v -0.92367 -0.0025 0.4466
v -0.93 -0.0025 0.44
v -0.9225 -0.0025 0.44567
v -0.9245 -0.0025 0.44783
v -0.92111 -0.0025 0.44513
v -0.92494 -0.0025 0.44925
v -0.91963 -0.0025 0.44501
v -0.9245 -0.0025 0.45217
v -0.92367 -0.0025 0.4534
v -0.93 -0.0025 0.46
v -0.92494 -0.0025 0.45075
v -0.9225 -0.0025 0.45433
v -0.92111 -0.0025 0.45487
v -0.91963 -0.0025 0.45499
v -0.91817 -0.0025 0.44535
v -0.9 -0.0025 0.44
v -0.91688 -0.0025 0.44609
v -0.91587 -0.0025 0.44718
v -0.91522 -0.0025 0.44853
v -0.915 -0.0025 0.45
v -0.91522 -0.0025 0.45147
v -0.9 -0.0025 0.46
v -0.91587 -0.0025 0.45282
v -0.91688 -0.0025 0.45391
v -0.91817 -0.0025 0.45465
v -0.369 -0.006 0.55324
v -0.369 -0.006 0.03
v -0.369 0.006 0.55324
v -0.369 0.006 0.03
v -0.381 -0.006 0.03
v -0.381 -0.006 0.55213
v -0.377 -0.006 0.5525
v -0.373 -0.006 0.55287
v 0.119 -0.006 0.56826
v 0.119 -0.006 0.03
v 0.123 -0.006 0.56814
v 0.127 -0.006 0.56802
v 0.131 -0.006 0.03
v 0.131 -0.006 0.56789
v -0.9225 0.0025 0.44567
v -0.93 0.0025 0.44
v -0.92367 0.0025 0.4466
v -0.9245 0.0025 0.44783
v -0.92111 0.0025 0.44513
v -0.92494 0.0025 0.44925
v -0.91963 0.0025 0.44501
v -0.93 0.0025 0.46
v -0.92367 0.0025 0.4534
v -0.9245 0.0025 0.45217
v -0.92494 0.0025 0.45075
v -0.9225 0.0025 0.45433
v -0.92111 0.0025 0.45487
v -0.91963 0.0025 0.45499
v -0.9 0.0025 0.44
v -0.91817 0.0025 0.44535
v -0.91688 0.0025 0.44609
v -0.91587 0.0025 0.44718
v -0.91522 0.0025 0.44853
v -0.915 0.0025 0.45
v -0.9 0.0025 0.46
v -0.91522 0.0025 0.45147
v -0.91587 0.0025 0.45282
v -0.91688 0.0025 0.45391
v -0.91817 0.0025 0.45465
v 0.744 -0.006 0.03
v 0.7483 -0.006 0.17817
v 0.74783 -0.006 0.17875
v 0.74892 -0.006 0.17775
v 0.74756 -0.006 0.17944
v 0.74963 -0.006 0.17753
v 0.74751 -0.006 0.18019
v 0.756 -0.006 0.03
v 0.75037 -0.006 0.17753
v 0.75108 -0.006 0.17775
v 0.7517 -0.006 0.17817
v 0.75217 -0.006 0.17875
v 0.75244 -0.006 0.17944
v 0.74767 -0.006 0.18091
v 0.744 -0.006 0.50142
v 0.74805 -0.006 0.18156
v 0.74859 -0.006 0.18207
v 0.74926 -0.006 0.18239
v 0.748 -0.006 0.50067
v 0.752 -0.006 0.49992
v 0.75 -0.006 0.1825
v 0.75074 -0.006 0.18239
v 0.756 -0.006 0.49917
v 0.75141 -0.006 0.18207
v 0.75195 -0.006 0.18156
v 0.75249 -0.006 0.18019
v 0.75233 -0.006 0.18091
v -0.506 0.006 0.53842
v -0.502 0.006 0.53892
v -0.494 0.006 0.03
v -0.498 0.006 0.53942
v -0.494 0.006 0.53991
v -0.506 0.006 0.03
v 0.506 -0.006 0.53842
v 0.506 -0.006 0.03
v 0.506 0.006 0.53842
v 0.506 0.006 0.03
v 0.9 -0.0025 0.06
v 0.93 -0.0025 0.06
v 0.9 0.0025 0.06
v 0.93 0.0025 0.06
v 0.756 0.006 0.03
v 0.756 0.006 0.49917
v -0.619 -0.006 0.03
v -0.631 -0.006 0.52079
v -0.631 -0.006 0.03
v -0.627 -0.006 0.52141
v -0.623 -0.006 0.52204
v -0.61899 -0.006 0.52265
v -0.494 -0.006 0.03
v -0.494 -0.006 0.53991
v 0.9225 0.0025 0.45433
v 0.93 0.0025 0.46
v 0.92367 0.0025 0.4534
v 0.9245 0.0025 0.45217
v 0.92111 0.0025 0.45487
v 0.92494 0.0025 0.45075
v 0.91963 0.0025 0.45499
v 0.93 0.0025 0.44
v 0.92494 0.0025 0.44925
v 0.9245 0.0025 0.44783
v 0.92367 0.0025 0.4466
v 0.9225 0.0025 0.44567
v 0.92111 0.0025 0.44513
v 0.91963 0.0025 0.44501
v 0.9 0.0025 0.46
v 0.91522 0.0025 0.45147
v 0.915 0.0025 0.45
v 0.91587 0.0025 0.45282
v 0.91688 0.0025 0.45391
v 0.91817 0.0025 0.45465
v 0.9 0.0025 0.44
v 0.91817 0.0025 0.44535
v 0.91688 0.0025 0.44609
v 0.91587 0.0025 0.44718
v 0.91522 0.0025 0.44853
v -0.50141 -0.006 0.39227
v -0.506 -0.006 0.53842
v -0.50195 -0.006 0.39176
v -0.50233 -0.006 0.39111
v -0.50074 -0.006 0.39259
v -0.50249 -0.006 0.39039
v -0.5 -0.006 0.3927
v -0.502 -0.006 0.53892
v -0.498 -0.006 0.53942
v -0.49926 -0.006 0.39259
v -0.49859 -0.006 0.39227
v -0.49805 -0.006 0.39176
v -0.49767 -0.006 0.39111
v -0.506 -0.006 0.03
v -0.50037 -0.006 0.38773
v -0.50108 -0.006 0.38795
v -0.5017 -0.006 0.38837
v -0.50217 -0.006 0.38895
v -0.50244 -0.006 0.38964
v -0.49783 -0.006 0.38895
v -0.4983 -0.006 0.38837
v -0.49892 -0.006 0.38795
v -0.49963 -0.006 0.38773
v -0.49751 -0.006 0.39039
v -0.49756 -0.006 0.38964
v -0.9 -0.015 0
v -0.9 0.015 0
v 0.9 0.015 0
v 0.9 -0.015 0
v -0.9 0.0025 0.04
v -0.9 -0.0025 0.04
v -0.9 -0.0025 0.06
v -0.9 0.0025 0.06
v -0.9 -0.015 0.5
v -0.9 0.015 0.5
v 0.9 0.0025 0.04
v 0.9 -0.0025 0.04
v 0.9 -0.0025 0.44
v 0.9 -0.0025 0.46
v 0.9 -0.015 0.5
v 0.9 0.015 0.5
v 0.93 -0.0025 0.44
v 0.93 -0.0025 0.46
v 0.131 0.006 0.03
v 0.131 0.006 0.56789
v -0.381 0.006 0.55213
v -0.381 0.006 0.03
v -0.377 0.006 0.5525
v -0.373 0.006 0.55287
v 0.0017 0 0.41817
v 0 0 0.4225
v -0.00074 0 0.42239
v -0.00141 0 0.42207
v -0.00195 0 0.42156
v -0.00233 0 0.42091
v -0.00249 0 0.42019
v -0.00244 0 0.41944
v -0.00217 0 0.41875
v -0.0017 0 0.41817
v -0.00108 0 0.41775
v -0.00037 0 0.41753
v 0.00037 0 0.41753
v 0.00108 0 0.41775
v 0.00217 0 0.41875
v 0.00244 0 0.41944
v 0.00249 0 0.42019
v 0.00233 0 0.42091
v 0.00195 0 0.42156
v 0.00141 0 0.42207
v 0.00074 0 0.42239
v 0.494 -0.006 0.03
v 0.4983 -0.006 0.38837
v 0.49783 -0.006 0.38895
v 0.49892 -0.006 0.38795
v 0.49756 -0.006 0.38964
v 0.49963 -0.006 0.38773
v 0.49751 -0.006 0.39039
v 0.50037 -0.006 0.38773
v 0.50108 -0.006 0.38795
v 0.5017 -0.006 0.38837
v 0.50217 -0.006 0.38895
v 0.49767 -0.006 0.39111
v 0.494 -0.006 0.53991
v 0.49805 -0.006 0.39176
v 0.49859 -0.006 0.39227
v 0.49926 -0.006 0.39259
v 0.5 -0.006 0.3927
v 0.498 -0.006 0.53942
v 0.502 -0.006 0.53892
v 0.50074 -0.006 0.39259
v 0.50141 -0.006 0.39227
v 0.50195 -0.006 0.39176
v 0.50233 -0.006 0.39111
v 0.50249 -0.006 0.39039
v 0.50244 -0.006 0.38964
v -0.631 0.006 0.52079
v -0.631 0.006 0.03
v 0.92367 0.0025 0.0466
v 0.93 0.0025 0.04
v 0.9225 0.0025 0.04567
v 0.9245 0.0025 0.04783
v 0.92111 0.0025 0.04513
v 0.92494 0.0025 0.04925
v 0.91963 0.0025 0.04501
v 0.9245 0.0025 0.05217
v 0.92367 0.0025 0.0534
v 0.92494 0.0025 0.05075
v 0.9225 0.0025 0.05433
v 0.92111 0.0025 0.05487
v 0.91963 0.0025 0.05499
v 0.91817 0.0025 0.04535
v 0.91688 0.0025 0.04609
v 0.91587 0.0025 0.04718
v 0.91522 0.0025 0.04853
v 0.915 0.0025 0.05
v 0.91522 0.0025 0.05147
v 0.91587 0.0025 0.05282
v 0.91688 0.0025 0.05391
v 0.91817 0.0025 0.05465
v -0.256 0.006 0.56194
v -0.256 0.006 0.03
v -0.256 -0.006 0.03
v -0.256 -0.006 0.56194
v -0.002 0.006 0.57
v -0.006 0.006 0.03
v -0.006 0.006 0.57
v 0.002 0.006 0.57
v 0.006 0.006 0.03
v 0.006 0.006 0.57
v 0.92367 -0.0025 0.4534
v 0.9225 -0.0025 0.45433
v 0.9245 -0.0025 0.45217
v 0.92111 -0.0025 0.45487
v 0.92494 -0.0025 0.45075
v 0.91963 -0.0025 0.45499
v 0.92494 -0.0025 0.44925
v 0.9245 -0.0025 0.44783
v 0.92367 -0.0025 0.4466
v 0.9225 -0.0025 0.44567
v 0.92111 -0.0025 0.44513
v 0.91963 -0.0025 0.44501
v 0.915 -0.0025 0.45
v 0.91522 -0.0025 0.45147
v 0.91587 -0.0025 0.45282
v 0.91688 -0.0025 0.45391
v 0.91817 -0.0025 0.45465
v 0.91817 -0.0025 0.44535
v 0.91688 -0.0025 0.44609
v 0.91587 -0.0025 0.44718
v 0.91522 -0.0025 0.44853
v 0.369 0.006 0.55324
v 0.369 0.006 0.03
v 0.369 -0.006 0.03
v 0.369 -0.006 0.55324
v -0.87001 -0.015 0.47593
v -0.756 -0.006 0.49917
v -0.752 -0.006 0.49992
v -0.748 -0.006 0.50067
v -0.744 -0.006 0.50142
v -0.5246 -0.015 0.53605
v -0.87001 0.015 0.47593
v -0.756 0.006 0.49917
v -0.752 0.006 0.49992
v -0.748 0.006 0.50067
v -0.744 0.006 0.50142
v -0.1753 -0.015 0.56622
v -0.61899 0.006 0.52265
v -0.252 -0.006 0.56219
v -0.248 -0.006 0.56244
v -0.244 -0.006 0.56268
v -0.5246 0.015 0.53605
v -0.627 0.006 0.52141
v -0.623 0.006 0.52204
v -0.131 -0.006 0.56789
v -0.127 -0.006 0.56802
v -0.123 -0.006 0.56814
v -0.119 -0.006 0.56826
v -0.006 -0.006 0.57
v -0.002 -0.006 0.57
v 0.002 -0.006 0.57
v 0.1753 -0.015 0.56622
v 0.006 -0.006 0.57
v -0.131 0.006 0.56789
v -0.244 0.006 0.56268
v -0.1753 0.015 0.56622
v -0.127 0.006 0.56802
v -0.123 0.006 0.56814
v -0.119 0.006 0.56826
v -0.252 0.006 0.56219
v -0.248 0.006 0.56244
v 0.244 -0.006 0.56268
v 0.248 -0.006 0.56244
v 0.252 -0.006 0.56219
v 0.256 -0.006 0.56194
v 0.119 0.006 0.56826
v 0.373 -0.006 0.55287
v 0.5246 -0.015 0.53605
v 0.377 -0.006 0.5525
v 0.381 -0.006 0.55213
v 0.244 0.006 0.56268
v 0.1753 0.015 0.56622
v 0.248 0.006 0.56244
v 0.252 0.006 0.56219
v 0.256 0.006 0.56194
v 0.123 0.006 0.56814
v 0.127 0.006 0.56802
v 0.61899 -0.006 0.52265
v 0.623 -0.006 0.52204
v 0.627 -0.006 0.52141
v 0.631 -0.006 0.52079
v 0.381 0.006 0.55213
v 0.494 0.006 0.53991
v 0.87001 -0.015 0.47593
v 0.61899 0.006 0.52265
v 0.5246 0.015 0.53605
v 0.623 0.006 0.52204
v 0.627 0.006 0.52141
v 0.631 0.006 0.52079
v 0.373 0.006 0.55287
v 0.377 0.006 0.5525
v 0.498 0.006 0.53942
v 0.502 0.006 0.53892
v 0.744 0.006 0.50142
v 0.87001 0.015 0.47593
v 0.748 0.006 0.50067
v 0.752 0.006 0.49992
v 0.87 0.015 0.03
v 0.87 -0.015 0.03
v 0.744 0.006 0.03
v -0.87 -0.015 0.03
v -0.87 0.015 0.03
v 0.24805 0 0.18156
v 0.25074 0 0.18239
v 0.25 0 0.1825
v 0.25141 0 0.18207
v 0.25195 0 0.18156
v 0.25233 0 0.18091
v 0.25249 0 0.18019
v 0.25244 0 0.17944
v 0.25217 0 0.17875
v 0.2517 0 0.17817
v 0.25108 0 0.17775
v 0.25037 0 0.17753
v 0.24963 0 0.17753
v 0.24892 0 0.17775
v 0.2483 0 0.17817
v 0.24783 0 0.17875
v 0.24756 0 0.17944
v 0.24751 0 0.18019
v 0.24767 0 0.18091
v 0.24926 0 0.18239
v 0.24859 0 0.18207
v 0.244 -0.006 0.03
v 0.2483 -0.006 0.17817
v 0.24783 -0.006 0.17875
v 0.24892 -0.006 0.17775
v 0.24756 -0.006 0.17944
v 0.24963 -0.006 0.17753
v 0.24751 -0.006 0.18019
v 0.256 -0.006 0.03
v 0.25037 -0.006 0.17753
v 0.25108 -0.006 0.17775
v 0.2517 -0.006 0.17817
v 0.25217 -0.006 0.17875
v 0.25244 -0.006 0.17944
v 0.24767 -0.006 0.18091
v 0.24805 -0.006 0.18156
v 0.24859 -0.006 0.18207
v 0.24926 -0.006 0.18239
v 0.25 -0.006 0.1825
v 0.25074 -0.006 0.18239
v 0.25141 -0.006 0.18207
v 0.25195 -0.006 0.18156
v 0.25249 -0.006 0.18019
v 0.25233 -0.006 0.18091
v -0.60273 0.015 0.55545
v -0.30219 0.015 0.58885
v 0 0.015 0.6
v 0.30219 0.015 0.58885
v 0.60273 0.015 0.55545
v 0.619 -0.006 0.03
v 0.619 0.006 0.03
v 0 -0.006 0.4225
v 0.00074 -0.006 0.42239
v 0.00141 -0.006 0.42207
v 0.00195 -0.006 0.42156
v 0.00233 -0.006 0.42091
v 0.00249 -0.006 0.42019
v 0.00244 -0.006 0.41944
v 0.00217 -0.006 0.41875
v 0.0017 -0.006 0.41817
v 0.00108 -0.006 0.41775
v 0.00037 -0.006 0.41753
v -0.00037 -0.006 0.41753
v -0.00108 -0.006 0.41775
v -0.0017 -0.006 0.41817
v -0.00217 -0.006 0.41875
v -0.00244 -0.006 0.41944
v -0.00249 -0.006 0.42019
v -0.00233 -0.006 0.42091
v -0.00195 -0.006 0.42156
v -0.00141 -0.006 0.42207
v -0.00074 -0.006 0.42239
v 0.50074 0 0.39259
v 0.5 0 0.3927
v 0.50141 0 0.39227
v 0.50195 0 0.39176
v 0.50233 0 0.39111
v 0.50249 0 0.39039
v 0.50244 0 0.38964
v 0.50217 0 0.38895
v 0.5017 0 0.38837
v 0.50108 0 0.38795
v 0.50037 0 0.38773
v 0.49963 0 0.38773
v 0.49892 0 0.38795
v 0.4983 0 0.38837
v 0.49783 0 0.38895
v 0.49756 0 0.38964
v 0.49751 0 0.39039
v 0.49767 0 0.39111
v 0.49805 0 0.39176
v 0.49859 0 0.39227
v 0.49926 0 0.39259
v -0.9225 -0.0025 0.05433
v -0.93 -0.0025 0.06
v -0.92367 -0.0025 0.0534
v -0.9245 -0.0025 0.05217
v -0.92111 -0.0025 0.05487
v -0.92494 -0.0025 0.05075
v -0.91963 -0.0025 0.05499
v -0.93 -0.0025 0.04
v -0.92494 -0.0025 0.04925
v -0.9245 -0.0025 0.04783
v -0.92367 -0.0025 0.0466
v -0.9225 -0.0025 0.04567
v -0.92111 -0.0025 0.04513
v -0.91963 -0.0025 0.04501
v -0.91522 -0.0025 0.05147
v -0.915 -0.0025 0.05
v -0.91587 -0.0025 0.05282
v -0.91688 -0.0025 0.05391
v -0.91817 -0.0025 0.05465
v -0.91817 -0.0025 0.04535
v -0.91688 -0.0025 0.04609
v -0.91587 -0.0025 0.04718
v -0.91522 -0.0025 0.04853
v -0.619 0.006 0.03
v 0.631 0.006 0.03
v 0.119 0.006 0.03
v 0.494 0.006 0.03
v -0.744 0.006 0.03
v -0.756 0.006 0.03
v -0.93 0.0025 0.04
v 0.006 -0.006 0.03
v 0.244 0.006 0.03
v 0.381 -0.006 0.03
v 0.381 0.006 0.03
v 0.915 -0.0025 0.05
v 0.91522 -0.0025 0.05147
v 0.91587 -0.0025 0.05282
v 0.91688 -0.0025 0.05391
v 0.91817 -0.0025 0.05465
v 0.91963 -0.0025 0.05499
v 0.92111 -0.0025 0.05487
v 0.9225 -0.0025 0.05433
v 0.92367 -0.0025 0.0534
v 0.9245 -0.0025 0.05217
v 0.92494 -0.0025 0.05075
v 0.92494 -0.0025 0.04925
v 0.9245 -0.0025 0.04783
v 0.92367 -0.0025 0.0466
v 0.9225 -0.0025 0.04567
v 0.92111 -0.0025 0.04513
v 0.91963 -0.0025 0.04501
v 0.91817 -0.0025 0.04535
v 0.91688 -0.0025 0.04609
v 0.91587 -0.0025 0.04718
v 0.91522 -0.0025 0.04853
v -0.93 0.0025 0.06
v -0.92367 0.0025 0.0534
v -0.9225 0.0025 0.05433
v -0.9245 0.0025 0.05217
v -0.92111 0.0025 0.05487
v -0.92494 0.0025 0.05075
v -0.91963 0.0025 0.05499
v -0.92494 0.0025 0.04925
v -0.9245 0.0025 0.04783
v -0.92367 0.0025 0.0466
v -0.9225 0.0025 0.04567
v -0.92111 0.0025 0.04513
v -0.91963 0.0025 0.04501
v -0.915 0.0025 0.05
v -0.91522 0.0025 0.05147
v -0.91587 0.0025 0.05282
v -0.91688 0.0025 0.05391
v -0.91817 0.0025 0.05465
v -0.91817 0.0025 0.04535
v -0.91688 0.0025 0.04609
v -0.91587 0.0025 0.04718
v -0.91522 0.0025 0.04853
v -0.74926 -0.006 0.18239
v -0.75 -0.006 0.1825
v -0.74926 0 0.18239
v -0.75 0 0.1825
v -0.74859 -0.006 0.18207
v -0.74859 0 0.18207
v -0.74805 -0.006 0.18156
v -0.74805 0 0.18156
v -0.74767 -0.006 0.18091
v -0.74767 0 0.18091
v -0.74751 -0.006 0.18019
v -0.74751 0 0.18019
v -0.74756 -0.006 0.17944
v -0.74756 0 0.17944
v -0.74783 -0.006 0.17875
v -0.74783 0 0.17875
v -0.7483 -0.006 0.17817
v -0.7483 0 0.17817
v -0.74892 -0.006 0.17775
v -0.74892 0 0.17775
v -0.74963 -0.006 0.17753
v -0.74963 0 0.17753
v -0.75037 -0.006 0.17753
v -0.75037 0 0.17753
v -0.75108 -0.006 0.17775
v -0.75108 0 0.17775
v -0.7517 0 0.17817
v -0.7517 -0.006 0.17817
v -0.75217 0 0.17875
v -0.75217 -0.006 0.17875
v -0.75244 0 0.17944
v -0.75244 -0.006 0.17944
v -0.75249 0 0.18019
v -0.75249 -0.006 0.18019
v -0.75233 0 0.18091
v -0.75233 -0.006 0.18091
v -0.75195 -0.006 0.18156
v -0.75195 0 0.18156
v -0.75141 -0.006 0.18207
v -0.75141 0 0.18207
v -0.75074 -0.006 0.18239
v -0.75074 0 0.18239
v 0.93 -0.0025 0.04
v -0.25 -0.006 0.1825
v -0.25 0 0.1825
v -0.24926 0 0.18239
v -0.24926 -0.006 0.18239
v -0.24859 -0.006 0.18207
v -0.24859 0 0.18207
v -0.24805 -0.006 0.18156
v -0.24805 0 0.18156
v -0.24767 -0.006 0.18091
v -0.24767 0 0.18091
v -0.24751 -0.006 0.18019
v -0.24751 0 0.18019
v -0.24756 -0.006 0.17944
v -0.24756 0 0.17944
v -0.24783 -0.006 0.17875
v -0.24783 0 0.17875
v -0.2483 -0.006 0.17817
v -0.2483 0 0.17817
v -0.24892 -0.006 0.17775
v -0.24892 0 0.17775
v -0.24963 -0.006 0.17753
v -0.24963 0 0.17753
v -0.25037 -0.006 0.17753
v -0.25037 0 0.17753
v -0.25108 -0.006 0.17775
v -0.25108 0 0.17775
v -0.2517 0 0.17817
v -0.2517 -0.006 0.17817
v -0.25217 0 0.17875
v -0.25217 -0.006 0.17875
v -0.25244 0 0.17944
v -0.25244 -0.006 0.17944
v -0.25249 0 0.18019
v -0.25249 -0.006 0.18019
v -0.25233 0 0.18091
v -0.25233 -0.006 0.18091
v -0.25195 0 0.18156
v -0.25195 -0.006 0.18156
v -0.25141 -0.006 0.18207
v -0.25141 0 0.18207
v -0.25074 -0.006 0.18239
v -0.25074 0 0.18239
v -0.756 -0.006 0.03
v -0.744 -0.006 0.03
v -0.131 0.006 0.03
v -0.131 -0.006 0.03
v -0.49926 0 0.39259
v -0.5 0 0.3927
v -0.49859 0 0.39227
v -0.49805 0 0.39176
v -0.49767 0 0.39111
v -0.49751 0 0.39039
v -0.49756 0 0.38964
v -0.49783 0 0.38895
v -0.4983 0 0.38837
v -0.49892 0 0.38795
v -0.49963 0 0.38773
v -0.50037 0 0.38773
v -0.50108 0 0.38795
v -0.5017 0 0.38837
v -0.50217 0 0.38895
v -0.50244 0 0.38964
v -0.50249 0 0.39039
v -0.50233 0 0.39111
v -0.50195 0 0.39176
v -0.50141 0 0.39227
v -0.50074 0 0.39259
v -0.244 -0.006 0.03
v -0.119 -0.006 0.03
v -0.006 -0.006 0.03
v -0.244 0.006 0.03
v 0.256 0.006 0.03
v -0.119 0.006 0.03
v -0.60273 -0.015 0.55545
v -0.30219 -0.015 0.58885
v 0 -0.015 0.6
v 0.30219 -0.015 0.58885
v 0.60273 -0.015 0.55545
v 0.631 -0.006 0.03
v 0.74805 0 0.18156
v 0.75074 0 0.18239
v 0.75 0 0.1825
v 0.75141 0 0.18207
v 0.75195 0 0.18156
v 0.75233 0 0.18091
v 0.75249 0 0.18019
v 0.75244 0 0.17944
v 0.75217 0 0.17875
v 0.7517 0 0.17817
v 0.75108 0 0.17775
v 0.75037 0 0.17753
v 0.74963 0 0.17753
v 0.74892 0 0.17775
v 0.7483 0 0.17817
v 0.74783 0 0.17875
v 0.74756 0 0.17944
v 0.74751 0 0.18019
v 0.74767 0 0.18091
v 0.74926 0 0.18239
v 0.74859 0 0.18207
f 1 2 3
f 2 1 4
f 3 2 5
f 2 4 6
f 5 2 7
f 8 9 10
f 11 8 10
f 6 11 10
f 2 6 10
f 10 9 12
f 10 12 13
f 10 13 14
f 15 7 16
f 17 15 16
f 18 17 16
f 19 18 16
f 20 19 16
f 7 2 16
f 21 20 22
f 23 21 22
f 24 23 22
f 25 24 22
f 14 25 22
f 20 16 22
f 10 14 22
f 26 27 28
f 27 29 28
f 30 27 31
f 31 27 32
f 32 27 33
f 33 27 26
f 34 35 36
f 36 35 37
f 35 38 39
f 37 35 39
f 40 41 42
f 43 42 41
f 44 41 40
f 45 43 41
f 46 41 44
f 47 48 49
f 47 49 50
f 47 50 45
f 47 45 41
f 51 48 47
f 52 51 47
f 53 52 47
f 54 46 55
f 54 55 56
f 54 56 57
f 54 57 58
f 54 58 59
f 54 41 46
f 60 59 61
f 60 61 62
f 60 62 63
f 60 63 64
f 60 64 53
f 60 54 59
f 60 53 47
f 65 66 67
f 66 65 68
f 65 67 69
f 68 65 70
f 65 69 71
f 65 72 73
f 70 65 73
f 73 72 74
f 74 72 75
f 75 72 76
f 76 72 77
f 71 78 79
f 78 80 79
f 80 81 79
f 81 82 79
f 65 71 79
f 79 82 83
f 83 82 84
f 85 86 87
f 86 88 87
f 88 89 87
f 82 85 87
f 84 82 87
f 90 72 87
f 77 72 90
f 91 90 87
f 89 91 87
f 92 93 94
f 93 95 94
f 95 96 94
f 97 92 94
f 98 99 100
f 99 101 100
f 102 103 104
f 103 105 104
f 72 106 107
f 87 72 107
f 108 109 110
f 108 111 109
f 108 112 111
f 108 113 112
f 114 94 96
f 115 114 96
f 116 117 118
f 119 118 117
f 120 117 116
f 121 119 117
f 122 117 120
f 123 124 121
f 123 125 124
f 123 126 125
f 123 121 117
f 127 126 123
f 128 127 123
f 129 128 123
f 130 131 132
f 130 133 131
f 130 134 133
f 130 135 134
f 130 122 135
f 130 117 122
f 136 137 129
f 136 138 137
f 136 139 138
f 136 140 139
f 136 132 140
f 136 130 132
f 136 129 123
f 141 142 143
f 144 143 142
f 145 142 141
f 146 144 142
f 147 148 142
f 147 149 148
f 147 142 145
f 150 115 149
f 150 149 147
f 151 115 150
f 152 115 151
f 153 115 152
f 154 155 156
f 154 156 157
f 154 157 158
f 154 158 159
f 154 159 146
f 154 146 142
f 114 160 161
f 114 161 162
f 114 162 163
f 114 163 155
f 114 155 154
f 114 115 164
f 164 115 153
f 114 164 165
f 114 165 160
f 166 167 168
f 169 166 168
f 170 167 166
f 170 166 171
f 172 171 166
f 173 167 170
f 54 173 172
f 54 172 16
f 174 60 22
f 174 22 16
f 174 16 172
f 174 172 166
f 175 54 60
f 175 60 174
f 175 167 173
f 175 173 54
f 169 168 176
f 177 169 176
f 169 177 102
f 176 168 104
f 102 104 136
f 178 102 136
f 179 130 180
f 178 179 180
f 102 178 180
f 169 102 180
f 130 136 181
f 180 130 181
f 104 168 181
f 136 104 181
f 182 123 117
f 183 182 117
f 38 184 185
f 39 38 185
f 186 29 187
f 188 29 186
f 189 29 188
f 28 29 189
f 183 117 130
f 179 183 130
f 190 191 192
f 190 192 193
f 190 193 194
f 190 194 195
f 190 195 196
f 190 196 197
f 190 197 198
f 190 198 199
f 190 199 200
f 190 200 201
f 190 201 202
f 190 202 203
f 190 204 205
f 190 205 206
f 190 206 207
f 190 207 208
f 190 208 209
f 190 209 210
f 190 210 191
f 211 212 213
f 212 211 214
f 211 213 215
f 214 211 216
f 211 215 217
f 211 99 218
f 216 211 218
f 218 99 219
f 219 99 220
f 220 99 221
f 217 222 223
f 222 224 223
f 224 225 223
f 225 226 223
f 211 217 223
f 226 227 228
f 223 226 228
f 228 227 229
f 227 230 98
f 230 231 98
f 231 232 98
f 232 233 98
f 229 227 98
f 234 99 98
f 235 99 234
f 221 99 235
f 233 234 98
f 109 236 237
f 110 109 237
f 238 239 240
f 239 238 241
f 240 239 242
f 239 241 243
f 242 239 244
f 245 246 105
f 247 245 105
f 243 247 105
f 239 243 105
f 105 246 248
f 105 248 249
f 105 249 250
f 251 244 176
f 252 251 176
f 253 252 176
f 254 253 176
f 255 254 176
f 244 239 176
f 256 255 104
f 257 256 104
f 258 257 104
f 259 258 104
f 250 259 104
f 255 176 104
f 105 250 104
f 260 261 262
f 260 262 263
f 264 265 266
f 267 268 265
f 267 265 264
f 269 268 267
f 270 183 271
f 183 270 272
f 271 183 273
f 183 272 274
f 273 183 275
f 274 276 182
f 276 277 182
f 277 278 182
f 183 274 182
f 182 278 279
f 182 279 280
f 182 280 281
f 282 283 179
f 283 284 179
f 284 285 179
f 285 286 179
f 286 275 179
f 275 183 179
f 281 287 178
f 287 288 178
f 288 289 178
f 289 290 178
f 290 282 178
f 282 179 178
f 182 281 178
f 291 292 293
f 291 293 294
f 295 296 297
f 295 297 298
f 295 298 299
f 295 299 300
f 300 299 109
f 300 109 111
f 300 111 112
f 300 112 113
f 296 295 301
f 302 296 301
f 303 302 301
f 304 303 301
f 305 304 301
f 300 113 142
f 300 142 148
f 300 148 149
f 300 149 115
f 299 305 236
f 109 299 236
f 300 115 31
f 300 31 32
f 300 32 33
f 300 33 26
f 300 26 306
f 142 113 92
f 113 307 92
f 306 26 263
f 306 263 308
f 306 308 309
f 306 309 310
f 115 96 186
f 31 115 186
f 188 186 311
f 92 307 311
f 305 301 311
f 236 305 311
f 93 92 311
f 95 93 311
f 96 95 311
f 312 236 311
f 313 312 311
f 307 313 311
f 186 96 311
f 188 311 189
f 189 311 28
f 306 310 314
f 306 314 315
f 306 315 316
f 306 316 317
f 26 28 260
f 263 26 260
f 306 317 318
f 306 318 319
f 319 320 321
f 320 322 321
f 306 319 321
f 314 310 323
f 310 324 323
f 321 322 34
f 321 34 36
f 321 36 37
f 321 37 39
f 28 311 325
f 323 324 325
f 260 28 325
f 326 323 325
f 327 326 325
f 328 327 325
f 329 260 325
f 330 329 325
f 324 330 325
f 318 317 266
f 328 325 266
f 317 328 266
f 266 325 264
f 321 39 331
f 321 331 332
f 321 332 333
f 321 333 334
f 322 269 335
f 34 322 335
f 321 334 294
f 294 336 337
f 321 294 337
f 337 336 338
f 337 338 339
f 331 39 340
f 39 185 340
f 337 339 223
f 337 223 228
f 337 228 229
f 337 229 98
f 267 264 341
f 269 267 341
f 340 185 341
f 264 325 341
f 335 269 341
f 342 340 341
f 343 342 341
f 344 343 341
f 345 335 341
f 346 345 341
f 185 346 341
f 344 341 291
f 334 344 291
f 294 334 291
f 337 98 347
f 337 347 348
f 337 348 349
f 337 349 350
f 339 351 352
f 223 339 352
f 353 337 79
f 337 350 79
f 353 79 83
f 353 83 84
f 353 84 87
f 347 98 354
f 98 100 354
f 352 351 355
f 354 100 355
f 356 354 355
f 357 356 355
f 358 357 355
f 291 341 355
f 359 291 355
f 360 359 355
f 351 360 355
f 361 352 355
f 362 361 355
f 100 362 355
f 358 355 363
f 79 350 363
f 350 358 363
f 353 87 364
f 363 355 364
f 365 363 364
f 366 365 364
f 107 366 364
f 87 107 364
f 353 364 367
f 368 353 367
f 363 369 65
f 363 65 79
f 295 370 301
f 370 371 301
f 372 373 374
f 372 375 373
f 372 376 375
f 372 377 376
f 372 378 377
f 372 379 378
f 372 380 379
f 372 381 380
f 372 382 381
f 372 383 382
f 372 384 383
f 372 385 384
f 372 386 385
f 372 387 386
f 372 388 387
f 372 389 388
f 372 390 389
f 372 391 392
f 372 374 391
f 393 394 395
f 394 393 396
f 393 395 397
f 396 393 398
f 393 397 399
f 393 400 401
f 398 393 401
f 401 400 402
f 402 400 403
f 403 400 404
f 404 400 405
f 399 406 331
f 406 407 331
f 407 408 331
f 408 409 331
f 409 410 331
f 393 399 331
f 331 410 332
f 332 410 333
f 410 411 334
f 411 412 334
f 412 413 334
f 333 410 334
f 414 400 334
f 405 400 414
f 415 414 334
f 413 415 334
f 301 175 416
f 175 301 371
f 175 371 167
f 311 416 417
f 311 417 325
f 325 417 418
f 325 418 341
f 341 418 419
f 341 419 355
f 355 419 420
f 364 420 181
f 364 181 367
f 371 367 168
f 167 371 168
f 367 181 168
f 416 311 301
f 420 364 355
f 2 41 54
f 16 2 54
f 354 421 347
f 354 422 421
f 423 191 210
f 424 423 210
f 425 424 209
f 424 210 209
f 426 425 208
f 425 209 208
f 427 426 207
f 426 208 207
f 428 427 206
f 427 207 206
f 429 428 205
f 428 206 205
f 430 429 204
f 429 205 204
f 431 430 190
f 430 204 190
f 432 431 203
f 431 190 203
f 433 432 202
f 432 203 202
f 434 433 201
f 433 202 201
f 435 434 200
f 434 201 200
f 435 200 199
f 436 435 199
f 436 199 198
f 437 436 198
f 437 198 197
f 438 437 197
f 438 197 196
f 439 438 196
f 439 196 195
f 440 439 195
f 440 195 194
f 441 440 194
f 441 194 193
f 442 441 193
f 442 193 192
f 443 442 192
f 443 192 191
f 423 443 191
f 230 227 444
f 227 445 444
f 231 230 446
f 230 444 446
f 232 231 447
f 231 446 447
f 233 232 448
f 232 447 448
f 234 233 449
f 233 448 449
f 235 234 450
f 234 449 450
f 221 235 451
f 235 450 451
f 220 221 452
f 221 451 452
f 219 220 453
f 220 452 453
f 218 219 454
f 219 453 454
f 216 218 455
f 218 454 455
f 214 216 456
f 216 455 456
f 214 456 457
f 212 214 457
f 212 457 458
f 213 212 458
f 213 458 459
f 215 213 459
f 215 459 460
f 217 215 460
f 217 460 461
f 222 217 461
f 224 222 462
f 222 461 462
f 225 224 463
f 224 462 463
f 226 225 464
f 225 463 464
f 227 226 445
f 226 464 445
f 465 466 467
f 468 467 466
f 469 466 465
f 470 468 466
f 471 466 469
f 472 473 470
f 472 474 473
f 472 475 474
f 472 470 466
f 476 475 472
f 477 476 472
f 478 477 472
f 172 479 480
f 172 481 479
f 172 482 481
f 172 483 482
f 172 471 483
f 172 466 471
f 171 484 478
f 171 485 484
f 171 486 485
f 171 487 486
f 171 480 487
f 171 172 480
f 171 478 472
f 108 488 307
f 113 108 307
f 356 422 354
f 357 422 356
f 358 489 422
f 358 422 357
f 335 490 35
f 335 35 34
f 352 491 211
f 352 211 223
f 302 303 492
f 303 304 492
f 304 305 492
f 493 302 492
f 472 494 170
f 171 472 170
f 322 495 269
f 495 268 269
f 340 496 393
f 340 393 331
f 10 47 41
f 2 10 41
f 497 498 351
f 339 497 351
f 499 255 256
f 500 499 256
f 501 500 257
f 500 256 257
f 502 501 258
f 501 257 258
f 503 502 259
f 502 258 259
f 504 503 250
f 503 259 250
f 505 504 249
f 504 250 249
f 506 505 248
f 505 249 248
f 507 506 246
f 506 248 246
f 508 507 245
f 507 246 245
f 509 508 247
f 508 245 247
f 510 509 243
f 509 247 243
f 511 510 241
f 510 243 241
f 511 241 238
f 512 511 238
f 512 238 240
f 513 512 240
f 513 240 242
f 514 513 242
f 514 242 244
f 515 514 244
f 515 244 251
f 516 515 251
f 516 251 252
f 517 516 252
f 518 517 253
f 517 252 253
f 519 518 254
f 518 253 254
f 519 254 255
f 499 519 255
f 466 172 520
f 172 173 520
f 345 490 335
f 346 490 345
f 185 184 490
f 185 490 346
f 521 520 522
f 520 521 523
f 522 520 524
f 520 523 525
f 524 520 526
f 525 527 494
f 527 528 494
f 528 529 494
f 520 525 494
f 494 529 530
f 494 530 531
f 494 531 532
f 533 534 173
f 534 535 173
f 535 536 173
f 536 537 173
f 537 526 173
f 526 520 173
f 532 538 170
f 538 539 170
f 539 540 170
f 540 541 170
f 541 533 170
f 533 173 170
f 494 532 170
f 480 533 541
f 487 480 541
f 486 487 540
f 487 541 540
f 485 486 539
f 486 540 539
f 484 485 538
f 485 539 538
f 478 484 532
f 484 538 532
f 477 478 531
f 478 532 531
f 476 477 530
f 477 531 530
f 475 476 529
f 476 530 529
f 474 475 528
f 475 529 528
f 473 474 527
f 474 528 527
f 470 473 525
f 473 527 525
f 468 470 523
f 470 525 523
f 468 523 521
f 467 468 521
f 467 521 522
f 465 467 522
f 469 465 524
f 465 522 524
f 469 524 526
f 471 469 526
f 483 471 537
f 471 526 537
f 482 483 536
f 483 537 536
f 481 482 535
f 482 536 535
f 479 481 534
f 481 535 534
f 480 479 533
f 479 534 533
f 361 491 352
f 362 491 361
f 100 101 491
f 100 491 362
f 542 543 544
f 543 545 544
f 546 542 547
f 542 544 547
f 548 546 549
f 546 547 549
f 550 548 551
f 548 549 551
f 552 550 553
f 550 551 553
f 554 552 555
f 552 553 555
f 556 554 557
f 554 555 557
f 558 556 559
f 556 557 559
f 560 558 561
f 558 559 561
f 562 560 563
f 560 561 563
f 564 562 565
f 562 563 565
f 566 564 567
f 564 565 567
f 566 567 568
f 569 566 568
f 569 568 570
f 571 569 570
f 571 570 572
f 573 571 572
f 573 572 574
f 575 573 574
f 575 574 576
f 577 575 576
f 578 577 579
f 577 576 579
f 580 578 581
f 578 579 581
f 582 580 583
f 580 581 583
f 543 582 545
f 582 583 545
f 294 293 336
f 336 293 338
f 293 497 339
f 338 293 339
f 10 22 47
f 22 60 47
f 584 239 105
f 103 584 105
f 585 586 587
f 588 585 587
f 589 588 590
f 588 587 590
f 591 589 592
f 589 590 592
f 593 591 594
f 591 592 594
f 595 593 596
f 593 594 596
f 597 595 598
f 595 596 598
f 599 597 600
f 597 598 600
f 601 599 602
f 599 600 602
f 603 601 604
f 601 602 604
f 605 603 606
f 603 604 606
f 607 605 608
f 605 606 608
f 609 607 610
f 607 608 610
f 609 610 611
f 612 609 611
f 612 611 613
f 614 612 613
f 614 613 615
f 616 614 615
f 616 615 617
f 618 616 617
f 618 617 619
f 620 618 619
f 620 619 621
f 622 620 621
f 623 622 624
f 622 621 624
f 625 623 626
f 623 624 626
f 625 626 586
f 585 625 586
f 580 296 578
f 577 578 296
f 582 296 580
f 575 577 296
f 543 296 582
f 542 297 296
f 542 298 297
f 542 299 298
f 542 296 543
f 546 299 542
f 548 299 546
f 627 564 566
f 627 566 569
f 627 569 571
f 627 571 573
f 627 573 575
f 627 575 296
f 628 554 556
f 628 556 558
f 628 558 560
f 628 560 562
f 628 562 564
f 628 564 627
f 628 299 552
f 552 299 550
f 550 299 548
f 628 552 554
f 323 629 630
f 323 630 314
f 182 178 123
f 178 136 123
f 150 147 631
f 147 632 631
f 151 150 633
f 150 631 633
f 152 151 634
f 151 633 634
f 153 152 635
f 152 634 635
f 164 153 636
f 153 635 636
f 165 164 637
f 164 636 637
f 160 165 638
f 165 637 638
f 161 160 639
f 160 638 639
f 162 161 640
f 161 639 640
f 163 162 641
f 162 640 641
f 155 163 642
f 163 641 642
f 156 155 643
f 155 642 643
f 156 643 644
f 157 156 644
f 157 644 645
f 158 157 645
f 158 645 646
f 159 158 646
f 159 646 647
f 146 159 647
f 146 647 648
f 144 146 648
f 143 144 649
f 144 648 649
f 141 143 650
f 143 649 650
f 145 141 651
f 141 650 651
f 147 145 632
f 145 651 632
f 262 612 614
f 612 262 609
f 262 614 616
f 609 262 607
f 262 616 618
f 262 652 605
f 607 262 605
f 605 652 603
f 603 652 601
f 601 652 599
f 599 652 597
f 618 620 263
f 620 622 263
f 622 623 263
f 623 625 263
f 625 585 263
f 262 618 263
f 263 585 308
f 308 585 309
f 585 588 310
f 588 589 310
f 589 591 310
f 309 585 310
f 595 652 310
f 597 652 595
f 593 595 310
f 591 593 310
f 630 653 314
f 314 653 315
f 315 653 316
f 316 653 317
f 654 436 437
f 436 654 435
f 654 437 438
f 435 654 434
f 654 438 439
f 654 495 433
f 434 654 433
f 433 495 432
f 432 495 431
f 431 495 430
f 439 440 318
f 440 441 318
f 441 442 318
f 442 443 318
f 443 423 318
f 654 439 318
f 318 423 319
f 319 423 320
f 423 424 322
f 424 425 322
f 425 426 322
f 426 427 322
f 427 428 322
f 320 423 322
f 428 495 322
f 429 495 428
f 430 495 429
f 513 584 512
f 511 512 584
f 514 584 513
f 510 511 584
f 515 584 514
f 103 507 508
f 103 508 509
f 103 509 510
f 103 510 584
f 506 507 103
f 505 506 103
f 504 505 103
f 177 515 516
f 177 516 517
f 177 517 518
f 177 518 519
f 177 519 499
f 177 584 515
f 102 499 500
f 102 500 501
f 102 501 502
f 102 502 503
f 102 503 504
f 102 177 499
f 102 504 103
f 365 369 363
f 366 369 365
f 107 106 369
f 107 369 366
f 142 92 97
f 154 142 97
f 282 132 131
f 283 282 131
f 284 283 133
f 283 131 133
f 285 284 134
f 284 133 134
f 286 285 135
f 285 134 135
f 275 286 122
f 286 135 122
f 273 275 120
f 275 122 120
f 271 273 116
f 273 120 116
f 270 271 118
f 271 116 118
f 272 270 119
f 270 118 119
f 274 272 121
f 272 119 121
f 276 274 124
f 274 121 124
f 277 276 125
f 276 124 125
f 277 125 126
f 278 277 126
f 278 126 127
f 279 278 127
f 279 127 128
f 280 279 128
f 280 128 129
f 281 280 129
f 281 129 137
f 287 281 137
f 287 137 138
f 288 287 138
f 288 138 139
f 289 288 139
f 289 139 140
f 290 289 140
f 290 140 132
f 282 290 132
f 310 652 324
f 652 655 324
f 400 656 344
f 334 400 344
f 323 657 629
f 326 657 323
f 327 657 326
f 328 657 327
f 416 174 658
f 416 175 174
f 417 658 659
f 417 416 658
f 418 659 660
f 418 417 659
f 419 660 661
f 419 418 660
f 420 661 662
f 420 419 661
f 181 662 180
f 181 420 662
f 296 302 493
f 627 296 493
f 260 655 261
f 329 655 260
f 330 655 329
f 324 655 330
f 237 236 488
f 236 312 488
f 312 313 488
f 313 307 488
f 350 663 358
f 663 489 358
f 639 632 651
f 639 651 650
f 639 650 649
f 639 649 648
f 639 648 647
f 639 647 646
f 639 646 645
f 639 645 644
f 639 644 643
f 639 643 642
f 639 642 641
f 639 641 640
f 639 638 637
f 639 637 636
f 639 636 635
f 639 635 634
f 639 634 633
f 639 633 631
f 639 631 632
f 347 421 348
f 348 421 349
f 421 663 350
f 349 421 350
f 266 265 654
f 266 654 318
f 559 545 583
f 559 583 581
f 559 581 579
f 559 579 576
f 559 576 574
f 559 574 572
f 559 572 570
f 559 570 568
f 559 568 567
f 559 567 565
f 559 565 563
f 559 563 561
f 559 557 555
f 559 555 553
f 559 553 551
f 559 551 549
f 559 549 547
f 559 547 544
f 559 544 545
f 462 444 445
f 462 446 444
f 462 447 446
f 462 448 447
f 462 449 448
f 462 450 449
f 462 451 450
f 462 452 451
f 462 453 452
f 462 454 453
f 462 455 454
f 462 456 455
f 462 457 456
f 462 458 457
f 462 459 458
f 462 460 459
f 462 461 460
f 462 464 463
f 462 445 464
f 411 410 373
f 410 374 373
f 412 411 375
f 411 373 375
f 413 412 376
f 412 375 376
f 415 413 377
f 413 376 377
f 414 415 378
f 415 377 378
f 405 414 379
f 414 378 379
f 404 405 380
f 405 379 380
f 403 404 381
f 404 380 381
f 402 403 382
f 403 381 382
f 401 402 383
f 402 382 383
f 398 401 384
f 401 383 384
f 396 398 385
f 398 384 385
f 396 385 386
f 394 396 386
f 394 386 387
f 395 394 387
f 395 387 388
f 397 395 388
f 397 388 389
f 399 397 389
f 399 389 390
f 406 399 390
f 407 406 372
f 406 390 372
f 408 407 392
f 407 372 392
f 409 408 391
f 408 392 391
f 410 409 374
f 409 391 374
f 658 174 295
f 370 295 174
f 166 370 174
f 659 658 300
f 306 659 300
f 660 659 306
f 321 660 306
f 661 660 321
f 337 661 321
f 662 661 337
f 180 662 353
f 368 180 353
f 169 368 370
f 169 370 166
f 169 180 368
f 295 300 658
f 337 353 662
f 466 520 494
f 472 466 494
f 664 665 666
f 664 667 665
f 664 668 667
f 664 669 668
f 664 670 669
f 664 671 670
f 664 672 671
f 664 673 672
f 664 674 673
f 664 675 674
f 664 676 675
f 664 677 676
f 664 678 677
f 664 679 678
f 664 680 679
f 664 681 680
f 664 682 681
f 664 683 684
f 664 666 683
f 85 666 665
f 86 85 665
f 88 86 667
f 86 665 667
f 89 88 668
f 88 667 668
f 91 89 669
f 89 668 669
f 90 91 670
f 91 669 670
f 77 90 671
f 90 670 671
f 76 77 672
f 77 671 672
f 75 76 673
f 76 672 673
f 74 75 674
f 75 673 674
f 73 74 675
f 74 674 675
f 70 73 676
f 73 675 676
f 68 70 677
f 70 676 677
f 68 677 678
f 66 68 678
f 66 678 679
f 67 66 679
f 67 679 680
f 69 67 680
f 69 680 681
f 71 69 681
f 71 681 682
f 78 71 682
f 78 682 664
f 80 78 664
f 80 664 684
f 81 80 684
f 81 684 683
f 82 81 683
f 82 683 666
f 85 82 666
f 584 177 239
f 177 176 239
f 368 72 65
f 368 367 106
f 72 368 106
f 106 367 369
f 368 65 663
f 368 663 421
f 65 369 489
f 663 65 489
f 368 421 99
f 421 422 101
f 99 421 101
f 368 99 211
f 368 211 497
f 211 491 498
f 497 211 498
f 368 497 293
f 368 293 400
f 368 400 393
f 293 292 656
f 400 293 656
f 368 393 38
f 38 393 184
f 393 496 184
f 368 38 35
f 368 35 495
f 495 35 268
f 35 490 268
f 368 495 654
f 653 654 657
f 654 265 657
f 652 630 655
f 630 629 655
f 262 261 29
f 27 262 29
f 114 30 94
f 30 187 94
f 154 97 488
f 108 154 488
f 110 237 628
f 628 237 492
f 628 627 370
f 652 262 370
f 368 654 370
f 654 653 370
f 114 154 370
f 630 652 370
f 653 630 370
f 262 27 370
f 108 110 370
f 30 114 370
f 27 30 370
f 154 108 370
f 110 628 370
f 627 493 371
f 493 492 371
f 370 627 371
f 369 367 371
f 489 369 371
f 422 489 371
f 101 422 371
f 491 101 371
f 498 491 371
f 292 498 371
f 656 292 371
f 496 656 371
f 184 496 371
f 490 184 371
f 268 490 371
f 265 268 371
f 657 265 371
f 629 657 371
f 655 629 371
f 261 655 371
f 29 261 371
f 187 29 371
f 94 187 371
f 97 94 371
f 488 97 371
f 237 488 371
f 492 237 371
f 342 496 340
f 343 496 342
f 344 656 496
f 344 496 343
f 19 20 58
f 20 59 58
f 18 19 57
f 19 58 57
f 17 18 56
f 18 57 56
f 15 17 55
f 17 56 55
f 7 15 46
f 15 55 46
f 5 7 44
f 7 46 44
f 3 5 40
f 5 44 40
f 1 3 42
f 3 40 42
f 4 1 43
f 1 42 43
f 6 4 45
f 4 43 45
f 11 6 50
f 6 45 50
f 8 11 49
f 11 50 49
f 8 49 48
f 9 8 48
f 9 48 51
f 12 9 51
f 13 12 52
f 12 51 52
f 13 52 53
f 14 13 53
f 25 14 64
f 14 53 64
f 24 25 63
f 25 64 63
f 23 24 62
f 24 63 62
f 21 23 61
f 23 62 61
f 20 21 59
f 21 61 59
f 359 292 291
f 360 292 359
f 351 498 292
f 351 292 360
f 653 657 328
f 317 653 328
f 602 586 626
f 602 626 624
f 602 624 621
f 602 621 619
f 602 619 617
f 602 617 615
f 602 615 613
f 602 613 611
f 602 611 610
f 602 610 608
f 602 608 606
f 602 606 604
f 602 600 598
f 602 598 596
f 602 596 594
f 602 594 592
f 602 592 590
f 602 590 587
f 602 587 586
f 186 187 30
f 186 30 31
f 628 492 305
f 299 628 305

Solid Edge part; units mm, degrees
sketch "Sketch1" plane through (0, 0, 0) normal (0, -1, 0) x (1, 0, 0)
  line L0 (-0.87, 0.03) -> (-0.87, 0.4759)
  arc A0 (-0.87, 0.4759) -> (0.87, 0.4759) centre (0, -3.5) cw
  line L1 (0.87, 0.4759) -> (0.87, 0.03)
  line L2 (0.87, 0.03) -> (-0.87, 0.03)
  line L3 (-0.9, 0) -> (0.9, 0)
  line L4 (0.9, 0) -> (0.9, 0.5)
  line L5 (-0.9, 0) -> (-0.9, 0.5)
  arc A1 (0.9, 0.5) -> (-0.9, 0.5) centre (0, -3.5) ccw
  dimension "D1" = 0.9
  dimension "D2" = 0.9
extrude "Protrusion1" add sketch "Sketch1" along normal mid plane 0.03
sketch "Sketch2" plane through (0, 0, 0) normal (0, -1, 0) x (1, 0, 0)
  line L0 (-0.756, 0.4992) -> (-0.756, 0.03)
  line L1 (-0.744, 0.03) -> (-0.756, 0.03)
  line L2 (-0.744, 0.03) -> (-0.744, 0.5014)
  arc A0 (-0.756, 0.4992) -> (-0.744, 0.5014) centre (0, -3.5) cw
  line L3 (-0.631, 0.5208) -> (-0.631, 0.03)
  line L4 (-0.619, 0.03) -> (-0.631, 0.03)
  line L5 (-0.619, 0.03) -> (-0.619, 0.5227)
  arc A1 (-0.631, 0.5208) -> (-0.619, 0.5227) centre (0, -3.5) cw
  line L6 (-0.506, 0.5384) -> (-0.506, 0.03)
  line L7 (-0.494, 0.03) -> (-0.506, 0.03)
  line L8 (-0.494, 0.03) -> (-0.494, 0.5399)
  arc A2 (-0.506, 0.5384) -> (-0.494, 0.5399) centre (0, -3.5) cw
  line L9 (-0.381, 0.03) -> (-0.381, 0.5521)
  arc A3 (-0.381, 0.5521) -> (-0.369, 0.5532) centre (0, -3.5) cw
  line L10 (-0.369, 0.03) -> (-0.369, 0.5532)
  line L11 (-0.369, 0.03) -> (-0.381, 0.03)
  line L12 (-0.256, 0.03) -> (-0.256, 0.5619)
  arc A4 (-0.256, 0.5619) -> (-0.244, 0.5627) centre (0, -3.5) cw
  line L13 (-0.244, 0.03) -> (-0.244, 0.5627)
  line L14 (-0.244, 0.03) -> (-0.256, 0.03)
  line L15 (-0.131, 0.03) -> (-0.131, 0.5679)
  arc A5 (-0.131, 0.5679) -> (-0.119, 0.5683) centre (0, -3.5) cw
  line L16 (-0.119, 0.03) -> (-0.119, 0.5683)
  line L17 (-0.119, 0.03) -> (-0.131, 0.03)
  line L18 (-0.006, 0.03) -> (-0.006, 0.57)
  arc A6 (-0.006, 0.57) -> (0.006, 0.57) centre (0, -3.5) cw
  line L19 (0.006, 0.03) -> (0.006, 0.57)
  line L20 (0.006, 0.03) -> (-0.006, 0.03)
  line L21 (0.119, 0.03) -> (0.119, 0.5683)
  arc A7 (0.119, 0.5683) -> (0.131, 0.5679) centre (0, -3.5) cw
  line L22 (0.131, 0.03) -> (0.131, 0.5679)
  line L23 (0.131, 0.03) -> (0.119, 0.03)
  line L24 (0.244, 0.03) -> (0.244, 0.5627)
  arc A8 (0.244, 0.5627) -> (0.256, 0.5619) centre (0, -3.5) cw
  line L25 (0.256, 0.03) -> (0.256, 0.5619)
  line L26 (0.256, 0.03) -> (0.244, 0.03)
  line L27 (0.369, 0.03) -> (0.369, 0.5532)
  arc A9 (0.369, 0.5532) -> (0.381, 0.5521) centre (0, -3.5) cw
  line L28 (0.381, 0.03) -> (0.381, 0.5521)
  line L29 (0.381, 0.03) -> (0.369, 0.03)
  line L30 (0.494, 0.03) -> (0.494, 0.5399)
  arc A10 (0.494, 0.5399) -> (0.506, 0.5384) centre (0, -3.5) cw
  line L31 (0.506, 0.03) -> (0.506, 0.5384)
  line L32 (0.506, 0.03) -> (0.494, 0.03)
  line L33 (0.619, 0.03) -> (0.619, 0.5227)
  arc A11 (0.619, 0.5227) -> (0.631, 0.5208) centre (0, -3.5) cw
  line L34 (0.631, 0.03) -> (0.631, 0.5208)
  line L35 (0.631, 0.03) -> (0.619, 0.03)
  arc A12 (0.744, 0.5014) -> (0.756, 0.4992) centre (0, -3.5) cw
  line L36 (0.756, 0.03) -> (0.756, 0.4992)
  line L37 (0.756, 0.03) -> (0.744, 0.03)
  line L38 (0.744, 0.03) -> (0.744, 0.5014)
  dimension "D1" = 0.012
  dimension "D2" = 0.125
extrude "Stangen" add sketch "Sketch2" along normal mid plane 0.012
hole "Bohrung_1" at (0, 0, 0.42) direction (0, -1, 0) diameter 0.005 end through all
hole "Bohrung_2" at (-0.25, 0, 0.18) direction (0, -1, 0) diameter 0.005 end through all
hole "Hole1" at (-0.5, 0, 0.3902) direction (0, -1, 0) diameter 0.005 end through all
hole "Hole2" at (-0.75, 0, 0.18) direction (0, -1, 0) diameter 0.005 end through all
sketch "Sketch3" plane through (0, 0, 0) normal (0, -1, 0) x (1, 0, 0)
  line L0 (-0.9, 0.06) -> (-0.93, 0.06)
  line L1 (-0.93, 0.06) -> (-0.93, 0.04)
  line L2 (-0.93, 0.04) -> (-0.9, 0.04)
  line L3 (-0.9, 0.06) -> (-0.9, 0.04)
  circle A0 centre (-0.92, 0.05) radius 0.005
  circle A1 centre (-0.92, 0.45) radius 0.005
  line L4 (-0.9, 0.46) -> (-0.9, 0.44)
  line L5 (-0.93, 0.44) -> (-0.9, 0.44)
  line L6 (-0.93, 0.46) -> (-0.93, 0.44)
  line L7 (-0.9, 0.46) -> (-0.93, 0.46)
  dimension "D1" = 0.02
  dimension "D2" = 0.01
  dimension "D3" = 0.03
  dimension "D4" = 0.02
  dimension "D5" = 0.05
  dimension "D6" = 0.4
extrude "Laschen" add sketch "Sketch3" along normal mid plane 0.005
mirror "Mirror1" about plane through (0, 0, 0) normal (1, 0, 0) of "Bohrung_2", "Hole1", "Hole2", "Laschen"
